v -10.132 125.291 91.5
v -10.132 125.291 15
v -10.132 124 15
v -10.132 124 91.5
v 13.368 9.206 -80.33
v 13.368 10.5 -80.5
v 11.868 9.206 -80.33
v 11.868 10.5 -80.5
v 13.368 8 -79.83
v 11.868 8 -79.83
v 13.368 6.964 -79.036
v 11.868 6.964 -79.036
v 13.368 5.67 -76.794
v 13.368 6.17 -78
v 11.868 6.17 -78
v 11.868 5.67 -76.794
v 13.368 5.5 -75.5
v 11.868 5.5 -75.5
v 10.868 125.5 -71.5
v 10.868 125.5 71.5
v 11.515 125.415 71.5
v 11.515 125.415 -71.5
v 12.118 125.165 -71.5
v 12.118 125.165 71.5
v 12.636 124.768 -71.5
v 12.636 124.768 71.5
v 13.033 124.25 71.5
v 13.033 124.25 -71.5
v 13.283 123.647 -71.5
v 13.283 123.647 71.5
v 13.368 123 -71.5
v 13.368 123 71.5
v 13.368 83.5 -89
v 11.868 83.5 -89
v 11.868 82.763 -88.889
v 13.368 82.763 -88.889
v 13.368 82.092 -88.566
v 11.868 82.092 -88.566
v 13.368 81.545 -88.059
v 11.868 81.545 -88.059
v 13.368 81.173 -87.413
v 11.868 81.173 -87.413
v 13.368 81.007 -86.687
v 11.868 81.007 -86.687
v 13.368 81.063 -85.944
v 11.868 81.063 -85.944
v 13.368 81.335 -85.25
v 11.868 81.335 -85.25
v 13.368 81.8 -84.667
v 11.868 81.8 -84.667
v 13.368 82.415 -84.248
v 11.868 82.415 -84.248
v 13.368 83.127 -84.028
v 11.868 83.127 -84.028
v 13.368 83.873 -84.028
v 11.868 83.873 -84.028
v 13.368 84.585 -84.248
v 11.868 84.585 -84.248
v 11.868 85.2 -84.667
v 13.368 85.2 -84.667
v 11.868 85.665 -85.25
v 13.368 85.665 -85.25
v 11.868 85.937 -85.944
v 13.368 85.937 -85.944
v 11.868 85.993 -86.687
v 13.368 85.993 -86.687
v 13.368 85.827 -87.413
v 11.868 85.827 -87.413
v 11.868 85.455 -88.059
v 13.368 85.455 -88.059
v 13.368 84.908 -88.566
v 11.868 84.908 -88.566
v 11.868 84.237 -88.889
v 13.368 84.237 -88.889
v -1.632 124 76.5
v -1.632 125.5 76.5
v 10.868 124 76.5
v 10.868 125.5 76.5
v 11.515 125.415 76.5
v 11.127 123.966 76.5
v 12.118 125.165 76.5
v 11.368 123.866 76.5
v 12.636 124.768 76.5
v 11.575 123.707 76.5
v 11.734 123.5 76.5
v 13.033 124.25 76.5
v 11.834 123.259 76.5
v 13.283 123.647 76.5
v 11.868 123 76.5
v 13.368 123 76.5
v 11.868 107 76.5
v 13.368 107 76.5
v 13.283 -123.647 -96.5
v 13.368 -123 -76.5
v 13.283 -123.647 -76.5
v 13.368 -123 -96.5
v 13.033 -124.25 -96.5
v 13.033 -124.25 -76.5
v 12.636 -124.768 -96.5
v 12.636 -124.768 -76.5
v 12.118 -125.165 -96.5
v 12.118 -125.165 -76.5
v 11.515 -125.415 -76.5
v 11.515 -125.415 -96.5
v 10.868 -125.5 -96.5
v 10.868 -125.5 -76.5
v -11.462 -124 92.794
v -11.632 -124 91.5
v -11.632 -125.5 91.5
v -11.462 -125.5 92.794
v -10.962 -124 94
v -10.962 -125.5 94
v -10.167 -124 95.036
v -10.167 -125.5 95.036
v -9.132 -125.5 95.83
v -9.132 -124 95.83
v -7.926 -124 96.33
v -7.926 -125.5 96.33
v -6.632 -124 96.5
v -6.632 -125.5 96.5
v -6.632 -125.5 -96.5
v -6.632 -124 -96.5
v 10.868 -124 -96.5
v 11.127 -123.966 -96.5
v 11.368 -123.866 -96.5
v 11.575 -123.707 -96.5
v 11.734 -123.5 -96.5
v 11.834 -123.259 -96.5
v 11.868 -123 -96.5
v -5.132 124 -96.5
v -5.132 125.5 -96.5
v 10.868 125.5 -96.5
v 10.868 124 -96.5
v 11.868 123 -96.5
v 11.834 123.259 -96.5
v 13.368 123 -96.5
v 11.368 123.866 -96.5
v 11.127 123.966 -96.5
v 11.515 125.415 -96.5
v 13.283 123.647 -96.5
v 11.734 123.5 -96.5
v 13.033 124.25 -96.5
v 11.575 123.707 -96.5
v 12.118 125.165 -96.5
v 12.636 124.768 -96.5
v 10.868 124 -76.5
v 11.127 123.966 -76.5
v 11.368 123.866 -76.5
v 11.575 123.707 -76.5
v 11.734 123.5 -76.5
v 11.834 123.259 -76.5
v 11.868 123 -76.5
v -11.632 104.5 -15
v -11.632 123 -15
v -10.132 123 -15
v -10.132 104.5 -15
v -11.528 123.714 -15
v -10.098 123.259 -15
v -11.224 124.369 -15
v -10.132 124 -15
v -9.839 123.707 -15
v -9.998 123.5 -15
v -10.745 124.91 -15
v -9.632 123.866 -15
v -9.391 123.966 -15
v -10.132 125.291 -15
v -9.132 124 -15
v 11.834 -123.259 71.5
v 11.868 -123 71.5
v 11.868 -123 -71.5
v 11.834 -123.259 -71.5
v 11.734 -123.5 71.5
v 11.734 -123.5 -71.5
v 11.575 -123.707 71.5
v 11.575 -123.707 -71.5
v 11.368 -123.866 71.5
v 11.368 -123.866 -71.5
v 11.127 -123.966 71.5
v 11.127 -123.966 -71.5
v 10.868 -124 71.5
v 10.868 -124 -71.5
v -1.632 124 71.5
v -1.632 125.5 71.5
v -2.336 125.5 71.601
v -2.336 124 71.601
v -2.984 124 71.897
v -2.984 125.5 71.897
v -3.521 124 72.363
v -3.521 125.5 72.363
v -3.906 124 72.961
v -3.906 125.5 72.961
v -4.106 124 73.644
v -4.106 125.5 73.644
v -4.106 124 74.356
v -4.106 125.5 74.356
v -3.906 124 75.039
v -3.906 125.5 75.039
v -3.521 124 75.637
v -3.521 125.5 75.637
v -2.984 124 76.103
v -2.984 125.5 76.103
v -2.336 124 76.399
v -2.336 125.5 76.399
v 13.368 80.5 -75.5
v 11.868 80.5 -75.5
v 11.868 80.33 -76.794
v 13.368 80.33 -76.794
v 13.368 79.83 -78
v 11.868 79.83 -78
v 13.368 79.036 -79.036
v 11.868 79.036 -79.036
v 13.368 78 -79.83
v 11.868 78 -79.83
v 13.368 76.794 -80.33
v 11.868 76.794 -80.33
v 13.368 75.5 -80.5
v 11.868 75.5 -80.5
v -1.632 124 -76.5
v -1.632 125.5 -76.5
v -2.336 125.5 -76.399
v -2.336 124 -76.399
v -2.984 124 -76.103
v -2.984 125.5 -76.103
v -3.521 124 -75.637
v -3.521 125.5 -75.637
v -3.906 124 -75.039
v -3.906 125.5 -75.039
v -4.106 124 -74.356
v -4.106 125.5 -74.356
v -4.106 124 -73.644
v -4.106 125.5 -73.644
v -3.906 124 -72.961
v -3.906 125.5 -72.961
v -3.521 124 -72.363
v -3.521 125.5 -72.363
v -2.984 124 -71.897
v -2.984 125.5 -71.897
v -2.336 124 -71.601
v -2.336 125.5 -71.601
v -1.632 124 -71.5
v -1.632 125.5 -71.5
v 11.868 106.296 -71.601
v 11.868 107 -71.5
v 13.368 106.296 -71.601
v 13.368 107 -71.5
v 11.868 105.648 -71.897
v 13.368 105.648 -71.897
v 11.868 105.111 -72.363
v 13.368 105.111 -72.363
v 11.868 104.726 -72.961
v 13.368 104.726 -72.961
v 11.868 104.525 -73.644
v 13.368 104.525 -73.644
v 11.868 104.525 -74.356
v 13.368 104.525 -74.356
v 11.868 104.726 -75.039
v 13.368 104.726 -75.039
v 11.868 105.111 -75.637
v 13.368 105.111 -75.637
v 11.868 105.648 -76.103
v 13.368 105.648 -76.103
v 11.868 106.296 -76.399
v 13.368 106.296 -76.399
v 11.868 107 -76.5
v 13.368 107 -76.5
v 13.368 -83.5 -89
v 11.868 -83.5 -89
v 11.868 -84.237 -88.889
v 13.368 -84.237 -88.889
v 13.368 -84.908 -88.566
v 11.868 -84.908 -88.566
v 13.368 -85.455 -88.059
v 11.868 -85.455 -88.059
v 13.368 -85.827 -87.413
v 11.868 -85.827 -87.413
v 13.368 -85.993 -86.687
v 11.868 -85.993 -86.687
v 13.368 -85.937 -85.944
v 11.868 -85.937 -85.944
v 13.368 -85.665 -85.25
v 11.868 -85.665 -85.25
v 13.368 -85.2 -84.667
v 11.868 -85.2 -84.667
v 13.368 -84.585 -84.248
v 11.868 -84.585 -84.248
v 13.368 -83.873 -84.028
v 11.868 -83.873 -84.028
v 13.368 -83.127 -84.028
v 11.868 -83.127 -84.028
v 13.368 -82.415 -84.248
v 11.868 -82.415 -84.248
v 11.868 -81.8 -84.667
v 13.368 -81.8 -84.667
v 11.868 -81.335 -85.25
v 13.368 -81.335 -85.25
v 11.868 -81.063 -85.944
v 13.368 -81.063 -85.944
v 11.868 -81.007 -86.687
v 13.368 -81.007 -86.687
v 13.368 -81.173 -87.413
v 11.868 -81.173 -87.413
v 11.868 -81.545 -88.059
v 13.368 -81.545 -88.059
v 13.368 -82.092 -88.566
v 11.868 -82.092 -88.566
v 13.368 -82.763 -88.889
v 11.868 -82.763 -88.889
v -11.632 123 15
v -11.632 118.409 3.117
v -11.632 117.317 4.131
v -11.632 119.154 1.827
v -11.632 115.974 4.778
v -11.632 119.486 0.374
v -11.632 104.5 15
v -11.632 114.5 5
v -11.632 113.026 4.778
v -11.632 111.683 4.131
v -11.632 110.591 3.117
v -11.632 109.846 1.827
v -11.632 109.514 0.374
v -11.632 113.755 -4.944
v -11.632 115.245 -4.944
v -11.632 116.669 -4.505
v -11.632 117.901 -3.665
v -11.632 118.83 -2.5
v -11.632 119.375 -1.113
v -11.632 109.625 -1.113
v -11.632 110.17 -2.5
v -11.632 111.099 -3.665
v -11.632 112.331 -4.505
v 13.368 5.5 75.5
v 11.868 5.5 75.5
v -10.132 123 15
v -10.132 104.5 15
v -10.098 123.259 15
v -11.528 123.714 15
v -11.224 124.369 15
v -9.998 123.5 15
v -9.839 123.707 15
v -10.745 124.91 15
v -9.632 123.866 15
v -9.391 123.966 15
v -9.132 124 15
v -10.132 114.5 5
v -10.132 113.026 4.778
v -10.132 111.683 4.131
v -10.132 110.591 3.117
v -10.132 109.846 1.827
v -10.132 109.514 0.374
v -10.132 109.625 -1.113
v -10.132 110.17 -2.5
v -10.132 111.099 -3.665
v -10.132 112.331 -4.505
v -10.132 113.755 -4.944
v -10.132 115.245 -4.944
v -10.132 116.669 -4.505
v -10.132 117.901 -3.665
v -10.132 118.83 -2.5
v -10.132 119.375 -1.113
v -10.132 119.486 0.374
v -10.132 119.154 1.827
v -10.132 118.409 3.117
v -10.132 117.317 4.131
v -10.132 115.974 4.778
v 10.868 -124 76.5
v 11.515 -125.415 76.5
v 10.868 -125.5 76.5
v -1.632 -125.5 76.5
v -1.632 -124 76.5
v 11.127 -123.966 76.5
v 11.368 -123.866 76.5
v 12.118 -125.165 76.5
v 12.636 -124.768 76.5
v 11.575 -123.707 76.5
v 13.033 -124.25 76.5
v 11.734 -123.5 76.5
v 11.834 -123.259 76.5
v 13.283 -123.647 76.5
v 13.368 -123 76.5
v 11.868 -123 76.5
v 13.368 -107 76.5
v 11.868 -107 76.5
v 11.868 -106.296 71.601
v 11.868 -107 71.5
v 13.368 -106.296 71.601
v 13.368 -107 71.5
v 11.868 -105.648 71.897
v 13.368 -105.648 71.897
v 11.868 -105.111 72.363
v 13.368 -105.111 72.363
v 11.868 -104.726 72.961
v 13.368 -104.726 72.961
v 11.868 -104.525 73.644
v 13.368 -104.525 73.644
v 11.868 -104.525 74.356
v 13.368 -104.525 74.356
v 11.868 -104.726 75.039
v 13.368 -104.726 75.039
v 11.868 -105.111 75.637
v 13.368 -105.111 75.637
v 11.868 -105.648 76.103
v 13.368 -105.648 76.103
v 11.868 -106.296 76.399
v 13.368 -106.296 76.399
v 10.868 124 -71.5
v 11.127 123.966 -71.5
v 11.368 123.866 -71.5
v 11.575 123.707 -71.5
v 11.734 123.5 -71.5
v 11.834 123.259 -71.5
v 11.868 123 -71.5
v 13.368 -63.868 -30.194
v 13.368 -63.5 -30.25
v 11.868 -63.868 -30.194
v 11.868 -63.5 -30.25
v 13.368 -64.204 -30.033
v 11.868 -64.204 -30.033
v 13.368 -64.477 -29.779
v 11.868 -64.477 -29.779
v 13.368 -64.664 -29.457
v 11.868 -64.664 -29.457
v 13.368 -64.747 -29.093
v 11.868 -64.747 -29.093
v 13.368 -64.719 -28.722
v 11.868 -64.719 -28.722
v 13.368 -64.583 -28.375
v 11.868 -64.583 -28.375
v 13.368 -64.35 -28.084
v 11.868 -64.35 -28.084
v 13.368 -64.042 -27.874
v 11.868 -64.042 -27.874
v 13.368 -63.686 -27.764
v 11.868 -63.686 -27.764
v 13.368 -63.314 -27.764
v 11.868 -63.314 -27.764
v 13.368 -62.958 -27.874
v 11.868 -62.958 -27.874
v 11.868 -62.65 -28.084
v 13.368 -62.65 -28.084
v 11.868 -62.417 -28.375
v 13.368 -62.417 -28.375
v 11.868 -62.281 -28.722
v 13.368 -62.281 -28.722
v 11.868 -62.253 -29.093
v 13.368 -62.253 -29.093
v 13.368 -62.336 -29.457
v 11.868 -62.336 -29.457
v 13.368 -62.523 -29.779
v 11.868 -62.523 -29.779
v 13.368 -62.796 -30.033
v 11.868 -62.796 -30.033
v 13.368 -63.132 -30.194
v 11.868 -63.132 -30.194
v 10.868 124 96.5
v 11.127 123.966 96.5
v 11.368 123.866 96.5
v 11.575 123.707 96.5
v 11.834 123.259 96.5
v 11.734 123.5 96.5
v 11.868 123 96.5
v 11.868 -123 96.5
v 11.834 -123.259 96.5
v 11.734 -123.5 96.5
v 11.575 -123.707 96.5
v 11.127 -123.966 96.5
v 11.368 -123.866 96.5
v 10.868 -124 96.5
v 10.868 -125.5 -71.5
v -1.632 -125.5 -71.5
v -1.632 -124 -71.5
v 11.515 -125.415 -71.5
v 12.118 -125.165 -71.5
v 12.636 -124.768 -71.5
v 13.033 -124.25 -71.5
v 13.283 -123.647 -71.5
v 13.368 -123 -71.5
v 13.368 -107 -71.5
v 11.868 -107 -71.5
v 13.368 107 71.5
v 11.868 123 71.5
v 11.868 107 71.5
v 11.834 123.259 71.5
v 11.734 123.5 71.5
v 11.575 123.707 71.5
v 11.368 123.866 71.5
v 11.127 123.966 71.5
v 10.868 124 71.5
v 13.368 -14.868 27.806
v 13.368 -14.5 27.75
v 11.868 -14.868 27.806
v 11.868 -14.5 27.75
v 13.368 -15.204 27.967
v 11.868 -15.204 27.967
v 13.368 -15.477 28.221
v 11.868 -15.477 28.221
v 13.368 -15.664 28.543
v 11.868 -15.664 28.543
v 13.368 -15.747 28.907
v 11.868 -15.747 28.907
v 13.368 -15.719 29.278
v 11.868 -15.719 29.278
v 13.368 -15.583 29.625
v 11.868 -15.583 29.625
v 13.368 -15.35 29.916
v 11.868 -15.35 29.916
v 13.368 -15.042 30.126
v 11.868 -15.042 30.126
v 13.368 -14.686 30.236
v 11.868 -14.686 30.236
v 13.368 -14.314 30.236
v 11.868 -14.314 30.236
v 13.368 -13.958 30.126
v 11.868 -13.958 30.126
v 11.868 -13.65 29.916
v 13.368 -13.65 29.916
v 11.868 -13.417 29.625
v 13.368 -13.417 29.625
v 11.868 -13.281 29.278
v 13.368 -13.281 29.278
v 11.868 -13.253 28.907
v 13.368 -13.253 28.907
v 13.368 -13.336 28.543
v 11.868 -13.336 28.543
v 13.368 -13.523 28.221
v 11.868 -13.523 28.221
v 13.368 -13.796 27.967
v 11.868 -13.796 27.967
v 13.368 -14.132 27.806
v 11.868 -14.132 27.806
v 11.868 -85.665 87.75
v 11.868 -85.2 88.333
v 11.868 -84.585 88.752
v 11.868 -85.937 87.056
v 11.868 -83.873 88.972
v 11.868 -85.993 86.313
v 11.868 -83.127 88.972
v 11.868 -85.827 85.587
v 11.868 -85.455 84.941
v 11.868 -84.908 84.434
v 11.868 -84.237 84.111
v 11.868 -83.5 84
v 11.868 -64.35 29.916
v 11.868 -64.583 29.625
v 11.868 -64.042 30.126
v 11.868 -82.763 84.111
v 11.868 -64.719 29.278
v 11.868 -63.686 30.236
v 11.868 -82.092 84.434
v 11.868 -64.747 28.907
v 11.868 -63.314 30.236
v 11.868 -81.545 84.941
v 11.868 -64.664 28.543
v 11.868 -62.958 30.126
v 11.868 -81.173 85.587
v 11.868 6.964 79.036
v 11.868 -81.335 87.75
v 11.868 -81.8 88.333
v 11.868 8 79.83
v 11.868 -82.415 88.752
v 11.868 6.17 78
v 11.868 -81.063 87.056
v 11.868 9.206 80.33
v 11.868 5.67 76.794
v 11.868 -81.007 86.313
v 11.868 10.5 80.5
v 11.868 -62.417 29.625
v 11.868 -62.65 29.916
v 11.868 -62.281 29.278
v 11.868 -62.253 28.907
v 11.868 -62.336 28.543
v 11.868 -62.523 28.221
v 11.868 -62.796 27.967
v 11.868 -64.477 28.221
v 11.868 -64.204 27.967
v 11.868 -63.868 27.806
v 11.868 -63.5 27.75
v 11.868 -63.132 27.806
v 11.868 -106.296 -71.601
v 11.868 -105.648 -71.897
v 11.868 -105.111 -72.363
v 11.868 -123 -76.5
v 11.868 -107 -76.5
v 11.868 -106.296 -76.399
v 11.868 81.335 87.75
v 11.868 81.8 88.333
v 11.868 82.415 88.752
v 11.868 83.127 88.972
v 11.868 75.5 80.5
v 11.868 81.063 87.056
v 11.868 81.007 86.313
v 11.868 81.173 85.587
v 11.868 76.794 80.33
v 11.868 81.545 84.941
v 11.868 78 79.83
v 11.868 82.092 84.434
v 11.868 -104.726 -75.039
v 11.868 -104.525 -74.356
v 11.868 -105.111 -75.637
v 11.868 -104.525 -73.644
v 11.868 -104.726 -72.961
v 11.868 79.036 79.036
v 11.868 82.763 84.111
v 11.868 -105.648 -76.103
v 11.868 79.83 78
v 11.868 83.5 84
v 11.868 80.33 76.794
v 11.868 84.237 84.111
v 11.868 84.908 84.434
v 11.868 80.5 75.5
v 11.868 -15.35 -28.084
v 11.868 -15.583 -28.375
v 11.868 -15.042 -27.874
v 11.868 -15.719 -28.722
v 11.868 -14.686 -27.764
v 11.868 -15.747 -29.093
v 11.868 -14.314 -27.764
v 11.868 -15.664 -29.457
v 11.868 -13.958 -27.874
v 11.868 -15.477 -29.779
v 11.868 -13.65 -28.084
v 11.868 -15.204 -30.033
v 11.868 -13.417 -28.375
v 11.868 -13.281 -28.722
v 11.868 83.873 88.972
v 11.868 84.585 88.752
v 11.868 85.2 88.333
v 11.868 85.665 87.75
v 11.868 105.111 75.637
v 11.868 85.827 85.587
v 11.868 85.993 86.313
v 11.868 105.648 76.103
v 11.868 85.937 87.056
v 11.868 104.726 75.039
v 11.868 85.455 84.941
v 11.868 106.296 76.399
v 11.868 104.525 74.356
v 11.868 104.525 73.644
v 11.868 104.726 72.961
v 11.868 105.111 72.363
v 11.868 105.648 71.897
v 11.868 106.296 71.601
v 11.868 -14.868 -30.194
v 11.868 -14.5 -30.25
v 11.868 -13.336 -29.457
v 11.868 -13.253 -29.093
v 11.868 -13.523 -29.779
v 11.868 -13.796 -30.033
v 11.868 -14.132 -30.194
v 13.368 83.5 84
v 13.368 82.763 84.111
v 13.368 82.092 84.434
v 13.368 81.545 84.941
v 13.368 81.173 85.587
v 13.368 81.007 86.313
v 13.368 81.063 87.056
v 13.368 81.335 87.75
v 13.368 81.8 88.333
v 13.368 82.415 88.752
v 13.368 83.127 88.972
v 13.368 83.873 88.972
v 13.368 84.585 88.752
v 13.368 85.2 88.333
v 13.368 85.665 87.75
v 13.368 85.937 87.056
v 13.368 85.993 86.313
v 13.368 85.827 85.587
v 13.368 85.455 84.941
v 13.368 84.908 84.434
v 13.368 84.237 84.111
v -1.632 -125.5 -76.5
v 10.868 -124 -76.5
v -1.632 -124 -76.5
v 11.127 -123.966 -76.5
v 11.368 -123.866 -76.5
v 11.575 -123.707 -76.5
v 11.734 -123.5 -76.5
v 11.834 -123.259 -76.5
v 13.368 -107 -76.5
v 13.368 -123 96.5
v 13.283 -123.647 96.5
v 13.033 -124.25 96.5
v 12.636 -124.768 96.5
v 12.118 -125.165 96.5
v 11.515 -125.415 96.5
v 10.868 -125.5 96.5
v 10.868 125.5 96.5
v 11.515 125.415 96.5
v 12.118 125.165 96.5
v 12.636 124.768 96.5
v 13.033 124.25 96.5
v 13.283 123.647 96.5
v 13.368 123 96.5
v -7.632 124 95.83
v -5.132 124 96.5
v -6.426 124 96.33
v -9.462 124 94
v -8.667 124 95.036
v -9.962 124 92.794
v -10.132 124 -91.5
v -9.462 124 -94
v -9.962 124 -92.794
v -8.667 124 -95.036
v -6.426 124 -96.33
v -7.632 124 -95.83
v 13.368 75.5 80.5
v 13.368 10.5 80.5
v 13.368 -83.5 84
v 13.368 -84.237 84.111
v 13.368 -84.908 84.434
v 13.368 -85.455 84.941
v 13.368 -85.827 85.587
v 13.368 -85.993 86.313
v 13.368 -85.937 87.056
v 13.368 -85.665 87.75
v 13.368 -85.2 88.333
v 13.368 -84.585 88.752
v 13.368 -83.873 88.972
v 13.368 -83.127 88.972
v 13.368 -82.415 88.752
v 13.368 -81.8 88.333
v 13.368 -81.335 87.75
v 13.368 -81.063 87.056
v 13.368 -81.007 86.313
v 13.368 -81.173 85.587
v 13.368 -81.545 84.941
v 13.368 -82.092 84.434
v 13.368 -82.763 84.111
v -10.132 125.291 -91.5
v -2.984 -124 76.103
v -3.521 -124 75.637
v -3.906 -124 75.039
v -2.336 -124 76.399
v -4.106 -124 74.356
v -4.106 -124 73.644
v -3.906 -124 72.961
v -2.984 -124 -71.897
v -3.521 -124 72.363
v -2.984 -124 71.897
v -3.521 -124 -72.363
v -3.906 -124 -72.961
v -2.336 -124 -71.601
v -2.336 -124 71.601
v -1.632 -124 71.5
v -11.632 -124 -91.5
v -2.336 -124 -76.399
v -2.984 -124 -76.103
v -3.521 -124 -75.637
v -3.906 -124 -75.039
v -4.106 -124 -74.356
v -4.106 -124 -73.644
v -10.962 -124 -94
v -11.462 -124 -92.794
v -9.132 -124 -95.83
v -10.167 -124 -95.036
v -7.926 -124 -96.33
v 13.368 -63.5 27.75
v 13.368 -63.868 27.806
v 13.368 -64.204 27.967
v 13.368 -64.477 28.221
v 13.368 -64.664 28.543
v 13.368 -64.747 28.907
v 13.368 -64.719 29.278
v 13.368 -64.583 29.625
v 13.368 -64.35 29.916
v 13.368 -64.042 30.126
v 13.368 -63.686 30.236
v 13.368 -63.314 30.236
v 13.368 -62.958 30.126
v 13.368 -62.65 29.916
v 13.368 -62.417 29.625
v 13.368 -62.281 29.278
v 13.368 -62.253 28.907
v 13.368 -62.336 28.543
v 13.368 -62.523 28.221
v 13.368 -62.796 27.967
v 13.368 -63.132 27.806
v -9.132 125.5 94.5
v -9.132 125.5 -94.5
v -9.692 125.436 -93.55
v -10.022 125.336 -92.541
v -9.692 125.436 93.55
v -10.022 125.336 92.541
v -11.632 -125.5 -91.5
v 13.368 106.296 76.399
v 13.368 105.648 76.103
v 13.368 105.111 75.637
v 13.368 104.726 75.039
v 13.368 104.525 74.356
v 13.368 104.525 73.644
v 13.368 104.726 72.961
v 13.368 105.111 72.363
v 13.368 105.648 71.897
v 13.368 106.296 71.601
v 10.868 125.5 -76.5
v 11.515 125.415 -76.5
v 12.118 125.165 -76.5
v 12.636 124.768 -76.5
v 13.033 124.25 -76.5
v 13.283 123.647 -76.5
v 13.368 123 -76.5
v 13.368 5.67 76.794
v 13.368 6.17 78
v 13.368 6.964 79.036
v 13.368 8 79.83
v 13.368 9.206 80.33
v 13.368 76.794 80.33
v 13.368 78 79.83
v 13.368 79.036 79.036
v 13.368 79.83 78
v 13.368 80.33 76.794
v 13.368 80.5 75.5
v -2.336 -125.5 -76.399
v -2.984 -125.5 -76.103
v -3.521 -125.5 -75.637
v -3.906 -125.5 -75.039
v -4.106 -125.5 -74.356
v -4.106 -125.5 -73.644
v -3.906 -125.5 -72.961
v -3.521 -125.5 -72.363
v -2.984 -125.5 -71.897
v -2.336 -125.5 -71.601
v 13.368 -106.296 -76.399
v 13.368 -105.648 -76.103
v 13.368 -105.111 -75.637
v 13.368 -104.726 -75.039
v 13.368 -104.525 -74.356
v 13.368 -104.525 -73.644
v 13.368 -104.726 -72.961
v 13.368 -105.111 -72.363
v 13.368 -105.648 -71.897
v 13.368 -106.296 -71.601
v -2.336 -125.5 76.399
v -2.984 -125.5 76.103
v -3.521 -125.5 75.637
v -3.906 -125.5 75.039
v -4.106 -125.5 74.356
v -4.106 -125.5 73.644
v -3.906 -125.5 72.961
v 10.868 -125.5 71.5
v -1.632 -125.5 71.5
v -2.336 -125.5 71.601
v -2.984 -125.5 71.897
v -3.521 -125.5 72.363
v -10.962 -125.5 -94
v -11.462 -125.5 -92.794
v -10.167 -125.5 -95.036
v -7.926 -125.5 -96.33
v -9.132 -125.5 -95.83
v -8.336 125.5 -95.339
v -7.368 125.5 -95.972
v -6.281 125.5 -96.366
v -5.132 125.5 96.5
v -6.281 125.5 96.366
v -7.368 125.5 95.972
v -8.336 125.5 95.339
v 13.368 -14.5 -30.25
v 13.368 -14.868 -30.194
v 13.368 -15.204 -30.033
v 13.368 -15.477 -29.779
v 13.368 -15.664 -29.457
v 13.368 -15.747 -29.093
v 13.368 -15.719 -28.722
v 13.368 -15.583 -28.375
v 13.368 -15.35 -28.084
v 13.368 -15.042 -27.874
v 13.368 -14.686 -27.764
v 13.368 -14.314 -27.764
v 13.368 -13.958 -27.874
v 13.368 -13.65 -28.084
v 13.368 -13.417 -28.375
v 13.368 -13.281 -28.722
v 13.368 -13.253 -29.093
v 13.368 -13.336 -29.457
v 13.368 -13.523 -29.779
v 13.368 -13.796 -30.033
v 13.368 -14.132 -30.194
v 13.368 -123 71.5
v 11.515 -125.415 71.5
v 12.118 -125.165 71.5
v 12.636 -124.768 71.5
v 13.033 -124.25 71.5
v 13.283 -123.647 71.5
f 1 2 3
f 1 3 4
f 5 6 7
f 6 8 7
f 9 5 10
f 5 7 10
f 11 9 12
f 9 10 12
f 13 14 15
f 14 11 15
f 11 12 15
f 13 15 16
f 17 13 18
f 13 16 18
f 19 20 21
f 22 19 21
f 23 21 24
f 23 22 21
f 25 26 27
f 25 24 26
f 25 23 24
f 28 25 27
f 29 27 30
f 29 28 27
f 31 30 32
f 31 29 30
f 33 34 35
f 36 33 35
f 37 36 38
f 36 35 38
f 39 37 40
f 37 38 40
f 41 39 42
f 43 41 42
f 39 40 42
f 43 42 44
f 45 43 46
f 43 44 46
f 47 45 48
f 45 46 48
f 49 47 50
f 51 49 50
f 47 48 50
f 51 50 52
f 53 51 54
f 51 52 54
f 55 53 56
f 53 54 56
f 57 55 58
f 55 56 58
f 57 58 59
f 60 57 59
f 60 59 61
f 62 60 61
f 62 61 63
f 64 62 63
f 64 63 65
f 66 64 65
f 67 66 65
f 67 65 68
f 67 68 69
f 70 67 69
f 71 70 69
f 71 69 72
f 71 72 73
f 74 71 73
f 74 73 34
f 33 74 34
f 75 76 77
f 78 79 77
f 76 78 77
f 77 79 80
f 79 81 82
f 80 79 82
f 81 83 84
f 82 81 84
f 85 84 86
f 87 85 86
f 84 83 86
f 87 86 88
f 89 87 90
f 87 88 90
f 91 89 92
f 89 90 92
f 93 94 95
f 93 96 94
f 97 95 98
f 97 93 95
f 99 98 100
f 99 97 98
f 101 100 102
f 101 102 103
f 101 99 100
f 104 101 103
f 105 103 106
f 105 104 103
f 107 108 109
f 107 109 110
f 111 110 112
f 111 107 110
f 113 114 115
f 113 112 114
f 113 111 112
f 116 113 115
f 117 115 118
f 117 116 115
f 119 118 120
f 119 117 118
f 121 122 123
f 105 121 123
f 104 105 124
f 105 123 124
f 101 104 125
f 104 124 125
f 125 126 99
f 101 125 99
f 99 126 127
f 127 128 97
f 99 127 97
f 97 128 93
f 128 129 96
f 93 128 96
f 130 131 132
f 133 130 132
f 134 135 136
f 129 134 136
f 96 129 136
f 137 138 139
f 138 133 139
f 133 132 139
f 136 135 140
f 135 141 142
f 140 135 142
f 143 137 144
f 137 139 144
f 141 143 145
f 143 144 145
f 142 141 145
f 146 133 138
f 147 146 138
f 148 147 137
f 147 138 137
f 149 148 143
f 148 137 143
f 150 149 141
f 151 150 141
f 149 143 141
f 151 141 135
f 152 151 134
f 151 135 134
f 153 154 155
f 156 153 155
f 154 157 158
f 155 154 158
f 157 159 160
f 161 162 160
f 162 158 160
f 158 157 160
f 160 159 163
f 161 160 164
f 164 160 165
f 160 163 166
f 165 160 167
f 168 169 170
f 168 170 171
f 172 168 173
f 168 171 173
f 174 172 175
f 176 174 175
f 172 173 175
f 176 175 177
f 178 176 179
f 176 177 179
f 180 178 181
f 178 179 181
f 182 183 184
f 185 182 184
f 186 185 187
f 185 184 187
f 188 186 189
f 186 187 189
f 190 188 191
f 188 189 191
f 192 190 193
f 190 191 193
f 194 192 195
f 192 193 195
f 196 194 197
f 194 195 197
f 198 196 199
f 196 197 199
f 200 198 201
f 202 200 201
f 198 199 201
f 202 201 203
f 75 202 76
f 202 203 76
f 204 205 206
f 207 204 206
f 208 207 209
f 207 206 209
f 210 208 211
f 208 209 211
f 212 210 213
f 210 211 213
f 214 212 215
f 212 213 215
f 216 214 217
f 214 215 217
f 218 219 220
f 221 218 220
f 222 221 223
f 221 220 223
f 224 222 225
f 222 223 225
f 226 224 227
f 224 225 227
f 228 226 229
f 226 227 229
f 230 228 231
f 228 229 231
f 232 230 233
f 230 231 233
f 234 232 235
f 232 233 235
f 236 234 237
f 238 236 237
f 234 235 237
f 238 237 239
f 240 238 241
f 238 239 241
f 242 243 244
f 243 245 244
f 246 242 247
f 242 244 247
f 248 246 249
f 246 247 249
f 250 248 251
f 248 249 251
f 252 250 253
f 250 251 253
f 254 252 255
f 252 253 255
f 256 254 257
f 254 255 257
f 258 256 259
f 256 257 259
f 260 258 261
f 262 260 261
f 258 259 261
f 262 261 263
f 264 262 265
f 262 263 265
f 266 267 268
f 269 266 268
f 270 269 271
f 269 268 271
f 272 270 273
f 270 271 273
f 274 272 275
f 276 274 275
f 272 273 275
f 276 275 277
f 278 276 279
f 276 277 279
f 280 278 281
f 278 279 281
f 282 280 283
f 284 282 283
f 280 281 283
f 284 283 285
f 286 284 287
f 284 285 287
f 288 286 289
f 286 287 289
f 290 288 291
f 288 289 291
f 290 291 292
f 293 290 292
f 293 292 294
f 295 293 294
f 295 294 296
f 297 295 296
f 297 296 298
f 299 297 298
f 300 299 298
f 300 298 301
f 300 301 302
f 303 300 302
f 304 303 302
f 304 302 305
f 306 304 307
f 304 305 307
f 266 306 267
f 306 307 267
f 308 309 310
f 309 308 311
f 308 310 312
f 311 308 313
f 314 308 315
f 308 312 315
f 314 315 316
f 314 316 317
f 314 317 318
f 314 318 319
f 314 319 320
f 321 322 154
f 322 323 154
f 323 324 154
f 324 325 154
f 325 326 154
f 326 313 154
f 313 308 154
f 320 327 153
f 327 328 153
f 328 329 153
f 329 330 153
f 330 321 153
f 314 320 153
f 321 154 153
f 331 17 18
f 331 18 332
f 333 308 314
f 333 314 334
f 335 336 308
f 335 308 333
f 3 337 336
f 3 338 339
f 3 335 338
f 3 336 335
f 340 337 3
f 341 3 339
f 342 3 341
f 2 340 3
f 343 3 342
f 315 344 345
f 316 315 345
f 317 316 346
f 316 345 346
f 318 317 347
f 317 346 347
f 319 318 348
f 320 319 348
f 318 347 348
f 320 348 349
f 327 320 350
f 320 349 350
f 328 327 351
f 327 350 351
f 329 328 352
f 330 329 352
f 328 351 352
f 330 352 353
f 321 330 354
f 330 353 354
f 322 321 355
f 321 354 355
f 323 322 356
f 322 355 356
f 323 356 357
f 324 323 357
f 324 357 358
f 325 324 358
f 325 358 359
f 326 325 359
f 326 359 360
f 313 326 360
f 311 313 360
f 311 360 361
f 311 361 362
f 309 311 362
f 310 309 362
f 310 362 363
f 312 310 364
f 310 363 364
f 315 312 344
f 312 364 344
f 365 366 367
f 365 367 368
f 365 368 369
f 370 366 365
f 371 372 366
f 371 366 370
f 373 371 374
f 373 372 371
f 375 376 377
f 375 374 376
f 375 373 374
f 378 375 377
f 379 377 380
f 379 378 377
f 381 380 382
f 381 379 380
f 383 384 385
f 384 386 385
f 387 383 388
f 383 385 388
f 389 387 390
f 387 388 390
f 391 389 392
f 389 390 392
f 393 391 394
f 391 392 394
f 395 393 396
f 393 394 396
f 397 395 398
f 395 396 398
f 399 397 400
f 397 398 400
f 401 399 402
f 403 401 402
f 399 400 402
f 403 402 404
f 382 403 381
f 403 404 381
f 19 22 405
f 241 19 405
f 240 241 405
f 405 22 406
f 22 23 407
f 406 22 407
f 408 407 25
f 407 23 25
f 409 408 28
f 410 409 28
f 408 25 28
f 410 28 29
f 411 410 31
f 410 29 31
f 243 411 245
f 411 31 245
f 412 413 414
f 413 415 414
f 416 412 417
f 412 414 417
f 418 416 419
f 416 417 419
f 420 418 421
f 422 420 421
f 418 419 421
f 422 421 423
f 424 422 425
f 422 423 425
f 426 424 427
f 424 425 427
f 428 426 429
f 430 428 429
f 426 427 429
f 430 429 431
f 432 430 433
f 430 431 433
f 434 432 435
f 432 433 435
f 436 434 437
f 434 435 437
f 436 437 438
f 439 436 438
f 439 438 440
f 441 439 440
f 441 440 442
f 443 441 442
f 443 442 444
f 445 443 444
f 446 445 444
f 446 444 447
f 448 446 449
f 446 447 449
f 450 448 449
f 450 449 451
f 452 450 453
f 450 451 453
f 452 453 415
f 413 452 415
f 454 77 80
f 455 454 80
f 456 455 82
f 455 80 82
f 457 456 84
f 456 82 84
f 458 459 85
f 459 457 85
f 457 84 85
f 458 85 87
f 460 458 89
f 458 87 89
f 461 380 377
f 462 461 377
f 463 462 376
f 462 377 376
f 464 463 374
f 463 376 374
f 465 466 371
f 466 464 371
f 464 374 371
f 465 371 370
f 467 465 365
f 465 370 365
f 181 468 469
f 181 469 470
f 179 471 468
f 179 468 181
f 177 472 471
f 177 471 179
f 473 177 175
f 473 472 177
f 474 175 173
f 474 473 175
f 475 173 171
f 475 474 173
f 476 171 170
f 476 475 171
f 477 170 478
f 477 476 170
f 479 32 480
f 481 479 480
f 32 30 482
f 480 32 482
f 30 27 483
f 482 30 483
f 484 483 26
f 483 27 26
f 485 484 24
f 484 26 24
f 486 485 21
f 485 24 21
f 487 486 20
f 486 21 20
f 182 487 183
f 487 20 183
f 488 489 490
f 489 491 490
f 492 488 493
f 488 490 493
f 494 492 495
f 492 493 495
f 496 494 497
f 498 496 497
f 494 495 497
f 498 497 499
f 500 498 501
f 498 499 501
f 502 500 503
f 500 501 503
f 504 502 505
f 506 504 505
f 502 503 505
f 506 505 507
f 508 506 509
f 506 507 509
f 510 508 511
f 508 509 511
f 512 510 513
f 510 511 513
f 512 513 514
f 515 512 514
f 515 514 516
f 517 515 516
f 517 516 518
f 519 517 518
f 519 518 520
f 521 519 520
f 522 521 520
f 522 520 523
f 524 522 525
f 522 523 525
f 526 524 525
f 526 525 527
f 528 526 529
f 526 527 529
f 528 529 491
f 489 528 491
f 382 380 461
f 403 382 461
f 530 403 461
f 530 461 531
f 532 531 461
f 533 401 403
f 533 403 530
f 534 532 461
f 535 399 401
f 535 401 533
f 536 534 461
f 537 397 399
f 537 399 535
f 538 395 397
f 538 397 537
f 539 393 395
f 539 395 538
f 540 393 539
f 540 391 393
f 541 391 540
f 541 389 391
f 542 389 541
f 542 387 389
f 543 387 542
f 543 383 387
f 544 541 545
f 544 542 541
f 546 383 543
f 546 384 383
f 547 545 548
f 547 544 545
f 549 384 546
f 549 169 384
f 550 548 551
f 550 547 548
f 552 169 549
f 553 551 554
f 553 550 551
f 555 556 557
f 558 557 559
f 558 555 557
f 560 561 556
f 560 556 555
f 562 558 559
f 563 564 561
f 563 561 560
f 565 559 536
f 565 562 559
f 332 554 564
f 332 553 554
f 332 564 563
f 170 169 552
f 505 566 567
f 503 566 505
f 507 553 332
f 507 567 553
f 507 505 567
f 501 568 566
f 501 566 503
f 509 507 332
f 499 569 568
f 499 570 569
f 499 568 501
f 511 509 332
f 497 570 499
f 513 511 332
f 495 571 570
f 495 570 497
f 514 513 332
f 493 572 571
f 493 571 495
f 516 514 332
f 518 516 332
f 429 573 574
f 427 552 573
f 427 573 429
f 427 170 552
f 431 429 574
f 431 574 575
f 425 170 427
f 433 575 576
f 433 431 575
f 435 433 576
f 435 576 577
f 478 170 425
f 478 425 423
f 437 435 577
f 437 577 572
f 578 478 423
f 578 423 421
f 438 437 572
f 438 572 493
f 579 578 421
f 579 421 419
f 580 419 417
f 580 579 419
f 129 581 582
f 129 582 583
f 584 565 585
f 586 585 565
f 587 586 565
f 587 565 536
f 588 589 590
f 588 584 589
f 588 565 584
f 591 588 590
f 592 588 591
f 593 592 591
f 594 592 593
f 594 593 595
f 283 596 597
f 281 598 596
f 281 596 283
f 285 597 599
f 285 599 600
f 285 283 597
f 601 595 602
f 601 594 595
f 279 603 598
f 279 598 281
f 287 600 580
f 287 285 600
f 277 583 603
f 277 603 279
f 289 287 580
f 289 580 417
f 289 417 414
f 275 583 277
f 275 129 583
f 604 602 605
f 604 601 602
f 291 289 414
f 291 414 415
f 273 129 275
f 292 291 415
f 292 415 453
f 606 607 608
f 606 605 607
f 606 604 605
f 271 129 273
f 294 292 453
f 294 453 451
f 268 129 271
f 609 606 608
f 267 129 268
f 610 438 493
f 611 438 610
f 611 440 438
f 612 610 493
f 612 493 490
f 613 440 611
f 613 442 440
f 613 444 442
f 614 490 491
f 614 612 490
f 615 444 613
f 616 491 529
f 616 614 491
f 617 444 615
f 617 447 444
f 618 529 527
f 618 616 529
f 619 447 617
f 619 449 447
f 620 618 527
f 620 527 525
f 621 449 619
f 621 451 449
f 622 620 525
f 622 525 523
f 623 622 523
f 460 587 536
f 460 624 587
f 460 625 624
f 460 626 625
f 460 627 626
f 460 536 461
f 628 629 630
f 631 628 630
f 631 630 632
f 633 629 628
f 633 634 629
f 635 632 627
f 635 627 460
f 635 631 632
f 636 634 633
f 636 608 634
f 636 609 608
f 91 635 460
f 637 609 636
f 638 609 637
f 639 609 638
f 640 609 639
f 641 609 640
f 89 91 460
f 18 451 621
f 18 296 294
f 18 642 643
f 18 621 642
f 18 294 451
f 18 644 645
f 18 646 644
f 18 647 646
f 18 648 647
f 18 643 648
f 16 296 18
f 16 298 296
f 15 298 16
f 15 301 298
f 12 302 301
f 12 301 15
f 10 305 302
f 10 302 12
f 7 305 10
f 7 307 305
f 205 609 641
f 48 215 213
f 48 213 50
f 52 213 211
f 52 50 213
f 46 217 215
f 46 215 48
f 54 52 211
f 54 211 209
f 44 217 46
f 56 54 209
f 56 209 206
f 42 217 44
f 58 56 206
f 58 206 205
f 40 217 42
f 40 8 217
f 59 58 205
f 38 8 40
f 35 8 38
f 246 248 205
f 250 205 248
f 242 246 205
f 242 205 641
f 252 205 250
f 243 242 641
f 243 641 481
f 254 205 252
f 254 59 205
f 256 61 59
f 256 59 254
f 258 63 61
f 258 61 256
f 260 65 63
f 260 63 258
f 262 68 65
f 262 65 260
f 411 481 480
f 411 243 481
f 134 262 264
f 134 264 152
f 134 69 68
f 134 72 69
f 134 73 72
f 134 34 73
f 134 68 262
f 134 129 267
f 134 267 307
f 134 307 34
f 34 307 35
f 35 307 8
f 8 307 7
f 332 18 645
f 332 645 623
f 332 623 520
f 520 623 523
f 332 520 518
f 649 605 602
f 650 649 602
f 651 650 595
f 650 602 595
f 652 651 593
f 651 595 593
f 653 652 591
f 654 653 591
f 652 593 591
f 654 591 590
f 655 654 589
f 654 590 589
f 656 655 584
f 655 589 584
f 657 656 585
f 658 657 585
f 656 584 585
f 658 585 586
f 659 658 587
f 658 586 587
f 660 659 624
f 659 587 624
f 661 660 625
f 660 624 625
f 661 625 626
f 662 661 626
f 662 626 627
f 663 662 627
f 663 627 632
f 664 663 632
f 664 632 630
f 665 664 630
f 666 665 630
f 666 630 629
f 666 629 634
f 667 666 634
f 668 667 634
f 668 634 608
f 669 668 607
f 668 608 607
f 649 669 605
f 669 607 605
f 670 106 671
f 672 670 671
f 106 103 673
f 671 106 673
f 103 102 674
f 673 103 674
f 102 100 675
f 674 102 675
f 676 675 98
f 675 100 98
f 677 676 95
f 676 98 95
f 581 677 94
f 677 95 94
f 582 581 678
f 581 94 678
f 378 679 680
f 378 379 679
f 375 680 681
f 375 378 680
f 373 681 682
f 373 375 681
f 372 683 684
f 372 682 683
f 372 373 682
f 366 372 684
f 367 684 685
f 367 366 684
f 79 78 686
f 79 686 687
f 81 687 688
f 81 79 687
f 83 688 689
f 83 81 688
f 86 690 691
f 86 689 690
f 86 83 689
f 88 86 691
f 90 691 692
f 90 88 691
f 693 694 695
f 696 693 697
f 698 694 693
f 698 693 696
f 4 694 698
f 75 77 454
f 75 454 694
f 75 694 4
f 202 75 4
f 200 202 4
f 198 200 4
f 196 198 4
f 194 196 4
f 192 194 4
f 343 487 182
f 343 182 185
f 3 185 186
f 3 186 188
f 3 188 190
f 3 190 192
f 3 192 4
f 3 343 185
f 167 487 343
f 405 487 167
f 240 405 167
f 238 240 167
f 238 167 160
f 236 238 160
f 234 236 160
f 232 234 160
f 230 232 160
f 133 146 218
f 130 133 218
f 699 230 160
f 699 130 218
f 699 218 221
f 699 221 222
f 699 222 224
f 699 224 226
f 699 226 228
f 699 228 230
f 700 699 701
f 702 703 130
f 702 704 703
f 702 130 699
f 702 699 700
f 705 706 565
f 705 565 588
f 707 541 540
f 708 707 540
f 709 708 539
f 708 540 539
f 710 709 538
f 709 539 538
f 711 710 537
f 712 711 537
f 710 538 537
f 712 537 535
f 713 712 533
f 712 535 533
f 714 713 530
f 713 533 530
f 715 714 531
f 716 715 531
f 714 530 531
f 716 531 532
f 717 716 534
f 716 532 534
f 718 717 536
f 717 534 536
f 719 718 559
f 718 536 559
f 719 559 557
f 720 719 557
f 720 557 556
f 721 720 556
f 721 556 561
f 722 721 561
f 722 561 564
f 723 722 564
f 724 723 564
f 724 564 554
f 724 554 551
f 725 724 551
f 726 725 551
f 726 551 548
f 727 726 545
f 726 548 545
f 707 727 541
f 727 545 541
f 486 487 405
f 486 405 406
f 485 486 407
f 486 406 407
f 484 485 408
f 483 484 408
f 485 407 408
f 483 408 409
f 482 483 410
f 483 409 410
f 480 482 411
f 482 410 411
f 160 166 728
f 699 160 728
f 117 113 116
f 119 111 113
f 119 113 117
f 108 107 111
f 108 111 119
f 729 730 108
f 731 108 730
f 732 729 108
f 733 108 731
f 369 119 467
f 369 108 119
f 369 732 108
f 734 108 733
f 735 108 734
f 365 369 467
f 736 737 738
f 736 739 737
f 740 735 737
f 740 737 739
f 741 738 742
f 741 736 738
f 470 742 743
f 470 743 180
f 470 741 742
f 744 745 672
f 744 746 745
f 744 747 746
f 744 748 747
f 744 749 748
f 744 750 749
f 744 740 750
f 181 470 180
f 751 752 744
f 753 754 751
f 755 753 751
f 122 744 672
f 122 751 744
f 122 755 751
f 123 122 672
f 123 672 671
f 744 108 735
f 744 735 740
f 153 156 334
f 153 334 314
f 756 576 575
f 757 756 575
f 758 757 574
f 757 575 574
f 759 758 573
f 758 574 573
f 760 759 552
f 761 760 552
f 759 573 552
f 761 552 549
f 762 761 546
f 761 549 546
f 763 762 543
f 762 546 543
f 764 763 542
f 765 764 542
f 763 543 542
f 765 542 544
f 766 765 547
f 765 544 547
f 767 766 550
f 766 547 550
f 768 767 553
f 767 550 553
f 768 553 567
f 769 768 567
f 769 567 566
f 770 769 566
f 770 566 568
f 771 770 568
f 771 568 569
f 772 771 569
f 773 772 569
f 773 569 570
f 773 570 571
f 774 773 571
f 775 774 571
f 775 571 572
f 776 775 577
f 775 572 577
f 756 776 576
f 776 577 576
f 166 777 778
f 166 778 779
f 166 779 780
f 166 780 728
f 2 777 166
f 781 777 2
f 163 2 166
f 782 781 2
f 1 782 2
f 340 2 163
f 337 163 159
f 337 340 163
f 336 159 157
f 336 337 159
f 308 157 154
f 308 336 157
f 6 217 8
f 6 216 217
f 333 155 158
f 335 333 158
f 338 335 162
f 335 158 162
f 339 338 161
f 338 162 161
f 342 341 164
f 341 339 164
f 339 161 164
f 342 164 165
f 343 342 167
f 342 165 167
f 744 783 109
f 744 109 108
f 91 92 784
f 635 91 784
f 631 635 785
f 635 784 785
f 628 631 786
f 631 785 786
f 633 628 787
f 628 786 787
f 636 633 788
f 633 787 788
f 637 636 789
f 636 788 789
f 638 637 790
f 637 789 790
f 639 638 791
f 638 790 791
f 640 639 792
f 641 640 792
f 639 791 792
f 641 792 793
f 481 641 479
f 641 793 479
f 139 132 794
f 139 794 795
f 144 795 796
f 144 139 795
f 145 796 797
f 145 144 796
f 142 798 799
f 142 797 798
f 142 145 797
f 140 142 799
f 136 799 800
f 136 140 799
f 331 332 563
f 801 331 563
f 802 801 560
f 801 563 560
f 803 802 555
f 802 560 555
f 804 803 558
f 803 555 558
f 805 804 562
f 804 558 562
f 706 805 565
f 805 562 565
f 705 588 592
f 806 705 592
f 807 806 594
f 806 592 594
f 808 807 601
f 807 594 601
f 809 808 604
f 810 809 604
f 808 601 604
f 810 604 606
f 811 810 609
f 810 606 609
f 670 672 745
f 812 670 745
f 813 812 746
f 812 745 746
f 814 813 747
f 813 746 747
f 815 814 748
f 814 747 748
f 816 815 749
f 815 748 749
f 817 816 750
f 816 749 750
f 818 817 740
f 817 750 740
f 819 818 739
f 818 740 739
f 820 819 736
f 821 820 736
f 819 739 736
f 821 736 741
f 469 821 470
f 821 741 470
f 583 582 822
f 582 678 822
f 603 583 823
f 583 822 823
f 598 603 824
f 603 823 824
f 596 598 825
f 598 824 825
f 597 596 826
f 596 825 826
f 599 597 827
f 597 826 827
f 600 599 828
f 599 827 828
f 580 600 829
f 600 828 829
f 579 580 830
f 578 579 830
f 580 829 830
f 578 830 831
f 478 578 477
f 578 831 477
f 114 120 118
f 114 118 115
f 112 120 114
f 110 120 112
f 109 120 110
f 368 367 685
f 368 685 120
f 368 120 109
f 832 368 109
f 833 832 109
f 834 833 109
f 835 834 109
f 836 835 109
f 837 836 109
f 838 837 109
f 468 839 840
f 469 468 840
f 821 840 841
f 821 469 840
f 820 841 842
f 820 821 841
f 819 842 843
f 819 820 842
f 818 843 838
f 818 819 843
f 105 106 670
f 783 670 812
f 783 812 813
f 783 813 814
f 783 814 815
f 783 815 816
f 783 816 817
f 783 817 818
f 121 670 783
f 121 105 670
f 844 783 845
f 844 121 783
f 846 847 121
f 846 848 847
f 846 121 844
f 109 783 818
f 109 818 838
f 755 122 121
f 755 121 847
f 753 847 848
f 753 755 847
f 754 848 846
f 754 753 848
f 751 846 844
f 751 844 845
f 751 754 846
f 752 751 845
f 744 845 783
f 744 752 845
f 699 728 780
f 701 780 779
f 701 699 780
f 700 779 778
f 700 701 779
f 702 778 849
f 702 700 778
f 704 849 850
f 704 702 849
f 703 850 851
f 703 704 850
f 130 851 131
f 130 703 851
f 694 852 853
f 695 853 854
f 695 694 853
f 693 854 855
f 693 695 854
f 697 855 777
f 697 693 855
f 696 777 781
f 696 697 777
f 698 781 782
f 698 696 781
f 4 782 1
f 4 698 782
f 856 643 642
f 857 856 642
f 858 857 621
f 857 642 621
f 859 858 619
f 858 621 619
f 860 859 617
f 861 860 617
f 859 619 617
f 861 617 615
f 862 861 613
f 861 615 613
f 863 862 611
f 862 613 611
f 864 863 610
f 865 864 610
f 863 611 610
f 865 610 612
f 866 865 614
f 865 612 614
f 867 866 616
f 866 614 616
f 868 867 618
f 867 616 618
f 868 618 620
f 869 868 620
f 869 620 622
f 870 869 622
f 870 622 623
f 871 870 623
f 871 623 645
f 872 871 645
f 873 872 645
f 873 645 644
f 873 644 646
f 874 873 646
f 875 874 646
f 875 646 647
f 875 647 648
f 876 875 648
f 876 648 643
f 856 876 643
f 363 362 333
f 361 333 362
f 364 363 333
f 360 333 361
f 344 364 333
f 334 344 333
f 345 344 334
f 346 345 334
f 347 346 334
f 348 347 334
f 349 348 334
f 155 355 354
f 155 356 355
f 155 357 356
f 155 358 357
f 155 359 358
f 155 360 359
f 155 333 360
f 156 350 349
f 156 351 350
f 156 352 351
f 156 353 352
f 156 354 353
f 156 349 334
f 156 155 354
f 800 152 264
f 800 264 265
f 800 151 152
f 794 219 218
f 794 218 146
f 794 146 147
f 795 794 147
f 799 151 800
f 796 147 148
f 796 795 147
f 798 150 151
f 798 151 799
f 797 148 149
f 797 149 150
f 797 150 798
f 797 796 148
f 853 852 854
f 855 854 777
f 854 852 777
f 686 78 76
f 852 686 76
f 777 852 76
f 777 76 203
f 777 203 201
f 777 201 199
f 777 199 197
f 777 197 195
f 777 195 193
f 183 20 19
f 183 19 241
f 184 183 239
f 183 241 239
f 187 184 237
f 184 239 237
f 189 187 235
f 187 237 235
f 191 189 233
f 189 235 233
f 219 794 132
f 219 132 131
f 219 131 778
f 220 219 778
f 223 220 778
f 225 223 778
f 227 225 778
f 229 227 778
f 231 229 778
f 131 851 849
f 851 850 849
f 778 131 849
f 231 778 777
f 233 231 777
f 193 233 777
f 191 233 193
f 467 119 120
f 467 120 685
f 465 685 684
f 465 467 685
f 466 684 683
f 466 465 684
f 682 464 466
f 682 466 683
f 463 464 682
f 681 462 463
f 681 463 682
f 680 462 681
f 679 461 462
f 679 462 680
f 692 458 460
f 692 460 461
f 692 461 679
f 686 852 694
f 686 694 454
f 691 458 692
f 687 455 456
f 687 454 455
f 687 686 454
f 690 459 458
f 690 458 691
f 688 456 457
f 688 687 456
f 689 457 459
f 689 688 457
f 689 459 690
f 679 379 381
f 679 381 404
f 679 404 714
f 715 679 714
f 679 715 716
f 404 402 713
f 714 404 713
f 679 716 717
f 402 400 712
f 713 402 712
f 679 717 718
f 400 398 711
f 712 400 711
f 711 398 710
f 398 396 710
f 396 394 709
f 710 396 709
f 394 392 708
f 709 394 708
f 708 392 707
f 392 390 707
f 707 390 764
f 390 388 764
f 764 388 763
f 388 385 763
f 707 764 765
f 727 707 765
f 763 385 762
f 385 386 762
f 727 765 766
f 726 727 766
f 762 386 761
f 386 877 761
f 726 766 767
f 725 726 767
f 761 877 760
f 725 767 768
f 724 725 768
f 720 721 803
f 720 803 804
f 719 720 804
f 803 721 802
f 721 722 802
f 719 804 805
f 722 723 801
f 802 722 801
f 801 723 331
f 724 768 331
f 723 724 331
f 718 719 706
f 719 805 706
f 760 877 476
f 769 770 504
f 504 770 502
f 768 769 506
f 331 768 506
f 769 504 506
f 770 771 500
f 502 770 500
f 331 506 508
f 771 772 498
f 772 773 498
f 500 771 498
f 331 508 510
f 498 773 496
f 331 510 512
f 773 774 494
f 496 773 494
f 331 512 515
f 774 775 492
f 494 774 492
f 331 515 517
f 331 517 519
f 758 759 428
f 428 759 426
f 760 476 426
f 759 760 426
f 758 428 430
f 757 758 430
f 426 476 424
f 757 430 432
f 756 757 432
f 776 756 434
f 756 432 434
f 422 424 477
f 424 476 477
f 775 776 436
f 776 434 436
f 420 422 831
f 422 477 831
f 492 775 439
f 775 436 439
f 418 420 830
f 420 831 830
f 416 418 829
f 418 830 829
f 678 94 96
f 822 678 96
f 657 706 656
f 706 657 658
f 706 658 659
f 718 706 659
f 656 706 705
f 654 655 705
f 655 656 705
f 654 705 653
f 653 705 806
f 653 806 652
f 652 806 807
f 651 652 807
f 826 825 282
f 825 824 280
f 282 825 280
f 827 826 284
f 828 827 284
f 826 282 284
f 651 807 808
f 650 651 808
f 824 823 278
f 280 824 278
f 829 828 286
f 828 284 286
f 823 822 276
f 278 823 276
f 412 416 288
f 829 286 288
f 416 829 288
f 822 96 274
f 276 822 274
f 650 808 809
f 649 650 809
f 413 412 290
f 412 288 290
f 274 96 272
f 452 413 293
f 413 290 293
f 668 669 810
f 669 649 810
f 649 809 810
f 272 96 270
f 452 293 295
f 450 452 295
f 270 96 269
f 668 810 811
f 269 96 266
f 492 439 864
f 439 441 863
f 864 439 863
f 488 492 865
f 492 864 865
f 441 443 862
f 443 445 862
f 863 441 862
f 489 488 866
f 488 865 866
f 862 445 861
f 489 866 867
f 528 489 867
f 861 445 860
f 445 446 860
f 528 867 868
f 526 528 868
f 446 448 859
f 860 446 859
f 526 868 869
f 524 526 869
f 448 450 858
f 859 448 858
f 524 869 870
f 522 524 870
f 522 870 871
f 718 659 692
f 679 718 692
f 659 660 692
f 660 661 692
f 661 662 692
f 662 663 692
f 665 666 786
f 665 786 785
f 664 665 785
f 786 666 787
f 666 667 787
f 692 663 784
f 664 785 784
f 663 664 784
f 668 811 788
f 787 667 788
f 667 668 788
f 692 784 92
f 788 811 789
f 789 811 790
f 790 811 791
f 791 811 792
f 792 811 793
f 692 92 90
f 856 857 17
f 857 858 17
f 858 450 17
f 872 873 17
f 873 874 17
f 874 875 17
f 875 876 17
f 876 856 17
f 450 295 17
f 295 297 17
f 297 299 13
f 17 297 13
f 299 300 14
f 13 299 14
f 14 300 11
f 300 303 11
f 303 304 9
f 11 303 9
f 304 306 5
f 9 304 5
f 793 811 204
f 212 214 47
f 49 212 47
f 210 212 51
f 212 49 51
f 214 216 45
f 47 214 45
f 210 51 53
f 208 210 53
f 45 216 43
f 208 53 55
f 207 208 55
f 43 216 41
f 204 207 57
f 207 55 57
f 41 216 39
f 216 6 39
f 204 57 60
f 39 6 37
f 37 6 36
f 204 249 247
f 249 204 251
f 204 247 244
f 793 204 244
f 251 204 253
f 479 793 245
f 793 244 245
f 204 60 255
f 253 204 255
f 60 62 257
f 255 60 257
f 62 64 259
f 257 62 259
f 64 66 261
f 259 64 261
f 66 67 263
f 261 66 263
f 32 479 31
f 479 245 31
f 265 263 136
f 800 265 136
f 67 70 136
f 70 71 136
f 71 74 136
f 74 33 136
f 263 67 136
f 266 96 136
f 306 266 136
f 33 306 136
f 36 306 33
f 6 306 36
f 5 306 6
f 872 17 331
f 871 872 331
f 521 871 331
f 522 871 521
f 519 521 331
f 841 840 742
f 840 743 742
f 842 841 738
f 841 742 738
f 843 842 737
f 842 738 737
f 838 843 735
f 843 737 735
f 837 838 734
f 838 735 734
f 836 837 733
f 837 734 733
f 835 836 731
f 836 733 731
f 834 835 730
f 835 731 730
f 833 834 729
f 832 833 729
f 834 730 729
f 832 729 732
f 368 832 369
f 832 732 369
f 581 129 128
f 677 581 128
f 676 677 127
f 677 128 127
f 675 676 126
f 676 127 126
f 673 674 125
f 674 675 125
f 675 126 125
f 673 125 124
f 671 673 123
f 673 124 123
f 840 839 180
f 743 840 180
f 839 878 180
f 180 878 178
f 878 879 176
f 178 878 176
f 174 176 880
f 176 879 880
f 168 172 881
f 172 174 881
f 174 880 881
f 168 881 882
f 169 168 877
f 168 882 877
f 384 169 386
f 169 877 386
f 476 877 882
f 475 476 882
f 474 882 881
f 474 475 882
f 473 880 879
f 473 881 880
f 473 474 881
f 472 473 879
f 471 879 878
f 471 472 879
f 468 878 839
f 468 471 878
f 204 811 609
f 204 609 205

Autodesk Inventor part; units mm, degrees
ref_plane "YZ Plane" through (0, 0, 0) normal (1, 0, 0) x (0, 1, 0)
ref_plane "XZ Plane" through (0, 0, 0) normal (0, 1, 0) x (-1, 0, 0)
ref_plane "XY Plane" through (0, 0, 0) normal (0, 0, 1) x (1, 0, 0)
sketch "Skizze1" plane through (0, 0, 0) normal (0, 0, 1) x (1, 0, 0)
  line L0 (-65.8319, 0) -> (313.5681, 0) projected
  line L1 (0, -176.4249) -> (0, 176.4249) projected
  line L2 (13.3681, -123) -> (13.3681, 123)
  line L3 (13.3681, -125.5) -> (259.3681, -125.5) construction
  line L4 (10.8681, 125.5) -> (-11.6319, 125.5)
  line L5 (-11.6319, 125.5) -> (-11.6319, 104.5)
  line L6 (10.8681, -125.5) -> (-11.6319, -125.5)
  line L7 (13.3681, -125.5) -> (35.8681, -125.5) construction
  line L8 (-11.6319, -125.5) -> (-11.6319, -124)
  line L9 (-11.6319, -124) -> (10.8681, -124)
  line L10 (11.8681, -123) -> (11.8681, 123)
  line L11 (10.8681, 124) -> (-10.1319, 124)
  line L12 (-10.1319, 124) -> (-10.1319, 104.5)
  line L13 (-10.1319, 104.5) -> (-11.6319, 104.5)
  arc A0 (13.3681, 123) -> (10.8681, 125.5) centre (10.8681, 123) ccw
  arc A1 (10.8681, -125.5) -> (13.3681, -123) centre (10.8681, -123) ccw
  arc A2 (10.8681, -124) -> (11.8681, -123) centre (10.8681, -123) ccw
  arc A3 (11.8681, 123) -> (10.8681, 124) centre (10.8681, 123) ccw
  point P0 (0, 0)
  point P1 (13.3681, 125.5)
  point P2 (11.8681, -124)
  point P3 (11.8681, 124)
  dimension "d0" = 251
  dimension "d1" = 90
  dimension "d2" = 25
  dimension "d3" = 90
  dimension "d4" = 21
  dimension "d5" = 90
  dimension "d6" = 25
  dimension "d7" = 180
  dimension "d8" = 1.5
  dimension "d9" = 90
  dimension "d10" = 23.5
  dimension "d11" = 90
  dimension "d12" = 248
  dimension "d13" = 90
  dimension "d14" = 22
  dimension "d15" = 90
  dimension "d17" = 1
extrude "Extrusion1" add sketch "Skizze1" along normal mid plane 193 contours L10 A3 L11 L1 L4 A0 L2 L0 | L0 L2 A1 L6 L1 L9 A2 L10 | L1 L6 L8 L9 | L11 L12 L13 L5 L4 L1
sketch "Skizze2" plane through (-11.6319, 104.5, 96.5) normal (-1, 0, 0) x (0, 0, 1)
  line L0 (-96.5, -280.2) -> (-96.5, 71.2) projected
  line L1 (-231.6, -104.5) -> (38.6, -104.5) projected
  line L2 (-193, 19.5) -> (-111.5, 19.5)
  line L3 (-111.5, 19.5) -> (-111.5, 0)
  line L4 (-111.5, 0) -> (-193, 0)
  line L5 (-193, 0) -> (-193, 19.5)
  line L6 (-193, -227.5) -> (-193, 18.5) projected
  line L7 (0, 21) -> (-193, 21) projected
  line L8 (0, 19.5) -> (-81.5, 19.5)
  line L9 (-81.5, 19.5) -> (-81.5, 0)
  line L10 (-81.5, 0) -> (0, 0)
  line L11 (0, 0) -> (0, 19.5)
  point P0 (-96.5, -104.5)
  dimension "d20" = 19.5
  dimension "d22" = 1.5
  dimension "d23" = 15
extrude "Extrusion2" cut sketch "Skizze2" against normal blind 2
sketch "Skizze3" plane through (-11.6319, 125.5, 96.5) normal (0, 1, 0) x (1, 0, 0)
  line L0 (-5, 96.5) -> (30, 96.5) projected
  line L1 (11.6319, 231.6) -> (11.6319, -38.6) projected
  line L2 (0, 0) -> (0, 81.5)
  line L3 (0, 81.5) -> (1.5, 81.5)
  line L4 (1.5, 81.5) -> (1.5, 0)
  line L5 (0, 81.5) -> (0, 0) projected
  line L6 (1.5, 0) -> (0, 0)
  line L7 (0, 0) -> (0, 193) projected
  line L8 (22.5, 0) -> (0, 0) projected
  line L9 (0, 193) -> (0, 111.5)
  line L10 (0, 111.5) -> (1.5, 111.5)
  line L11 (1.5, 111.5) -> (1.5, 193)
  line L12 (1.5, 193) -> (0, 193)
  point P0 (11.6319, 96.5)
  dimension "d27" = 1.5
  dimension "d28" = 15
extrude "Extrusion3" cut sketch "Skizze3" against normal blind 2 contours L7 L12 L11 L10 | L3 L4 L6 L2
fillet "Rundung1" radius 2.5 1 edges at (-11.6319, 125.5, 0)
fillet "Rundung2" radius 1 1 edges at (-10.1319, 124, 0)
hole "Bohrung1" at (-11.6319, 114.5, 0) direction (1, 0, 0) diameter 10 depth 8 tip angle 118
sketch "Skizze4" plane through (13.3681, -123, 96.5) normal (1, 0, 0) x (0, 0, -1)
  line L0 (231.6, 123) -> (-38.6, 123) projected
  line L1 (96.5, -52.7) -> (96.5, 298.7) projected
  line L2 (16, 203.5) -> (177, 203.5)
  line L3 (177, 203.5) -> (177, 128.5)
  line L4 (177, 128.5) -> (16, 128.5)
  line L5 (16, 128.5) -> (16, 203.5)
  line L6 (0, 0) -> (0, 246) projected
  line L7 (193, 0) -> (193, 246) projected
  line L8 (0, 248.5) -> (193, 248.5) projected
  point P0 (96.5, 123)
  dimension "d42" = 16
  dimension "d43" = 75
  dimension "d44" = 16
  dimension "d45" = 45
extrude "Extrusion4" cut sketch "Skizze4" against normal blind 2
hole "Bohrung2" at (13.3681, 83.5, -86.5) direction (-1, 0, 0) diameter 5 depth 8 tip angle 118
pattern_linear "Rechteckige Anordnung1" count 2 spacing 173 along (0, 0, 1) count 2 spacing 167 along (0, -1, 0) of "Bohrung2"
hole "Bohrung3" at (13.3681, -14.5, 29) direction (-1, 0, 0) diameter 2.5 depth 8 tip angle 118
pattern_linear "Rechteckige Anordnung2" count 2 spacing 58 along (0, 0, -1) count 2 spacing 49 along (0, -1, 0) of "Bohrung3"
sketch "Skizze5" plane through (13.3681, -123, 96.5) normal (1, 0, 0) x (0, 0, -1)
  line L0 (96.5, -52.7) -> (96.5, 298.7) projected
  line L1 (231.6, 123) -> (-38.6, 123) projected
  line L2 (20, -2.5) -> (20, 16)
  line L3 (25, -2.5) -> (25, 16)
  arc A0 (25, 16) -> (20, 16) centre (22.5, 16) ccw
  line L4 (0, 0) -> (0, 246) projected
  line L5 (0, -2.5) -> (193, -2.5) projected
  line L6 (20, -2.5) -> (25, -2.5)
  line L7 (173, -2.5) -> (173, 16)
  line L8 (168, -2.5) -> (168, 16)
  arc A1 (173, 16) -> (168, 16) centre (170.5, 16) ccw
  line L9 (173, -2.5) -> (168, -2.5)
  line L10 (20, 248.5) -> (20, 230)
  line L11 (25, 248.5) -> (25, 230)
  arc A2 (20, 230) -> (25, 230) centre (22.5, 230) ccw
  line L12 (20, 248.5) -> (25, 248.5)
  line L13 (173, 248.5) -> (173, 230)
  arc A3 (168, 230) -> (173, 230) centre (170.5, 230) ccw
  line L14 (168, 248.5) -> (168, 230)
  line L15 (173, 248.5) -> (168, 248.5)
  point P0 (96.5, 123)
  point P1 (0, 248.5)
  point P2 (193, 248.5)
  dimension "d78" = 5
  dimension "d79" = 22.5
  dimension "d80" = 18.5
extrude "Extrusion5" cut sketch "Skizze5" against normal blind 5
sketch "Skizze6" plane through (-9.1319, 125.5, -96.5) normal (0, 1, 0) x (1, 0, 0)
  line L0 (9.1319, 38.6) -> (9.1319, -231.6) projected
  line L1 (-7.5, -96.5) -> (27.5, -96.5) projected
  line L2 (7.5, -173) -> (20.5, -173)
  line L3 (21, -177) -> (21, -16) projected
  line L4 (20.5, -173) -> (20.5, -168)
  line L5 (20.5, -168) -> (7.5, -168)
  line L6 (22.5, -193) -> (22.5, -173) projected
  line L7 (17.5, -168) -> (20, -168) projected
  arc A0 (7.5, -168) -> (7.5, -173) centre (7.5, -170.5) ccw
  line L8 (7.5, -20) -> (20.5, -20)
  line L9 (20.5, -20) -> (20.5, -25)
  line L10 (20.5, -25) -> (7.5, -25)
  line L11 (17.5, -25) -> (20, -25)
  arc A1 (7.5, -20) -> (7.5, -25) centre (7.5, -22.5) ccw
  point P0 (9.1319, -96.5)
  dimension "d83" = 5
  dimension "d84" = 2
  dimension "d85" = 15
extrude "Extrusion6" cut sketch "Skizze6" against normal through all
fillet "Rundung3" radius 5 4 edges at (12.6181, 5.5, 80.5) (12.6181, 80.5, 80.5) (12.6181, 80.5, -80.5) (12.6181, 5.5, -80.5)
fillet "Rundung4" radius 5 4 edges at (-10.1319, 124.6456, -96.5) (-11.6319, -124.75, -96.5) (-11.6319, -124.75, 96.5) (-10.1319, 124.6456, 96.5)
properties part number "Innengehäuse gebogen" material "Stahl AISI 1015"
